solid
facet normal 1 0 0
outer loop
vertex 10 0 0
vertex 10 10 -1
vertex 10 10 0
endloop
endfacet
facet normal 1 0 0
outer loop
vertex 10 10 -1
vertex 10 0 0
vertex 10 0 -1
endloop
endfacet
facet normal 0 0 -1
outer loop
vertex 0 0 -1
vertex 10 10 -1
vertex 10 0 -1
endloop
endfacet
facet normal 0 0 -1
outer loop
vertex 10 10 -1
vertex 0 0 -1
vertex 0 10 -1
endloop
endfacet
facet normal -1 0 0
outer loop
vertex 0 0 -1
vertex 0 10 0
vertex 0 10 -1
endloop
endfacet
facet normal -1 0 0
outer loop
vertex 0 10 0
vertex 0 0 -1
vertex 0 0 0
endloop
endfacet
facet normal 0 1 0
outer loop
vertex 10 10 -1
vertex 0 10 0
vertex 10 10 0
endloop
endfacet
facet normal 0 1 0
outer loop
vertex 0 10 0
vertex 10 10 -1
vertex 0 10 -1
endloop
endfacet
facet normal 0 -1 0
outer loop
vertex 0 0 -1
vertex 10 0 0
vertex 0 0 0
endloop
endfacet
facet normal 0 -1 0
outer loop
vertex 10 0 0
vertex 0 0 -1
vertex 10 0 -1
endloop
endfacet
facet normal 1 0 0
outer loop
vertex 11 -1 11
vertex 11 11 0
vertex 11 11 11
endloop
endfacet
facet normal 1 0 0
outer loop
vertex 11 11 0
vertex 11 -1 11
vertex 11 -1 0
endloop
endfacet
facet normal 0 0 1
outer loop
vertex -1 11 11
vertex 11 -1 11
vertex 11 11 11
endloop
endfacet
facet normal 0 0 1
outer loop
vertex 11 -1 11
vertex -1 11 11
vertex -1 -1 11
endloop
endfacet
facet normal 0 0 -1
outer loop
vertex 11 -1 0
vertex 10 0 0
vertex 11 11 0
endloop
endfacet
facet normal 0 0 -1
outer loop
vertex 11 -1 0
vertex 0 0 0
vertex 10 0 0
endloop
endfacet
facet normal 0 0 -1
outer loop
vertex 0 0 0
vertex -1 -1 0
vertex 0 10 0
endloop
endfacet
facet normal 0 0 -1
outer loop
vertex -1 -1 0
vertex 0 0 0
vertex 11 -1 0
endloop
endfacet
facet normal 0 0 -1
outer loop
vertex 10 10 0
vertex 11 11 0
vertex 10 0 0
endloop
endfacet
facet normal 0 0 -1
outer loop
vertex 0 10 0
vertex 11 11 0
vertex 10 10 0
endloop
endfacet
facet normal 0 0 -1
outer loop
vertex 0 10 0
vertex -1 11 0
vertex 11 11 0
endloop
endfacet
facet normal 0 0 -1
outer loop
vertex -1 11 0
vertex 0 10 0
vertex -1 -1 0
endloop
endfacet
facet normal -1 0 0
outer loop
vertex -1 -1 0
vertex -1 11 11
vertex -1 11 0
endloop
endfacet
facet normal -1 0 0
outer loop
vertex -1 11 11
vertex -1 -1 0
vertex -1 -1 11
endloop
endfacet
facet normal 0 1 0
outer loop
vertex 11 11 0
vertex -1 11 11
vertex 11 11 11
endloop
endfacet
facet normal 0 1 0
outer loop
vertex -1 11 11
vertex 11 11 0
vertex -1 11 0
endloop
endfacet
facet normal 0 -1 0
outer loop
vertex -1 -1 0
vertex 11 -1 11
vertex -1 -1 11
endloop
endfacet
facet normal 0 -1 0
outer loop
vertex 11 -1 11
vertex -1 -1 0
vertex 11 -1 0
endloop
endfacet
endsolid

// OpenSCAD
// Unit of length: Unit.MM
union()
{
   color(c = [1.0, 0.0, 0.0, 1.0])
   {
      translate(v = [0.0, 0.0, -1.0])
      {
         cube(size = [10.0, 10.0, 11.0], center = false);
      }
   }
   translate(v = [-1.0, -1.0, 0.0])
   {
      cube(size = [12.0, 12.0, 11.0], center = false);
   }
}
